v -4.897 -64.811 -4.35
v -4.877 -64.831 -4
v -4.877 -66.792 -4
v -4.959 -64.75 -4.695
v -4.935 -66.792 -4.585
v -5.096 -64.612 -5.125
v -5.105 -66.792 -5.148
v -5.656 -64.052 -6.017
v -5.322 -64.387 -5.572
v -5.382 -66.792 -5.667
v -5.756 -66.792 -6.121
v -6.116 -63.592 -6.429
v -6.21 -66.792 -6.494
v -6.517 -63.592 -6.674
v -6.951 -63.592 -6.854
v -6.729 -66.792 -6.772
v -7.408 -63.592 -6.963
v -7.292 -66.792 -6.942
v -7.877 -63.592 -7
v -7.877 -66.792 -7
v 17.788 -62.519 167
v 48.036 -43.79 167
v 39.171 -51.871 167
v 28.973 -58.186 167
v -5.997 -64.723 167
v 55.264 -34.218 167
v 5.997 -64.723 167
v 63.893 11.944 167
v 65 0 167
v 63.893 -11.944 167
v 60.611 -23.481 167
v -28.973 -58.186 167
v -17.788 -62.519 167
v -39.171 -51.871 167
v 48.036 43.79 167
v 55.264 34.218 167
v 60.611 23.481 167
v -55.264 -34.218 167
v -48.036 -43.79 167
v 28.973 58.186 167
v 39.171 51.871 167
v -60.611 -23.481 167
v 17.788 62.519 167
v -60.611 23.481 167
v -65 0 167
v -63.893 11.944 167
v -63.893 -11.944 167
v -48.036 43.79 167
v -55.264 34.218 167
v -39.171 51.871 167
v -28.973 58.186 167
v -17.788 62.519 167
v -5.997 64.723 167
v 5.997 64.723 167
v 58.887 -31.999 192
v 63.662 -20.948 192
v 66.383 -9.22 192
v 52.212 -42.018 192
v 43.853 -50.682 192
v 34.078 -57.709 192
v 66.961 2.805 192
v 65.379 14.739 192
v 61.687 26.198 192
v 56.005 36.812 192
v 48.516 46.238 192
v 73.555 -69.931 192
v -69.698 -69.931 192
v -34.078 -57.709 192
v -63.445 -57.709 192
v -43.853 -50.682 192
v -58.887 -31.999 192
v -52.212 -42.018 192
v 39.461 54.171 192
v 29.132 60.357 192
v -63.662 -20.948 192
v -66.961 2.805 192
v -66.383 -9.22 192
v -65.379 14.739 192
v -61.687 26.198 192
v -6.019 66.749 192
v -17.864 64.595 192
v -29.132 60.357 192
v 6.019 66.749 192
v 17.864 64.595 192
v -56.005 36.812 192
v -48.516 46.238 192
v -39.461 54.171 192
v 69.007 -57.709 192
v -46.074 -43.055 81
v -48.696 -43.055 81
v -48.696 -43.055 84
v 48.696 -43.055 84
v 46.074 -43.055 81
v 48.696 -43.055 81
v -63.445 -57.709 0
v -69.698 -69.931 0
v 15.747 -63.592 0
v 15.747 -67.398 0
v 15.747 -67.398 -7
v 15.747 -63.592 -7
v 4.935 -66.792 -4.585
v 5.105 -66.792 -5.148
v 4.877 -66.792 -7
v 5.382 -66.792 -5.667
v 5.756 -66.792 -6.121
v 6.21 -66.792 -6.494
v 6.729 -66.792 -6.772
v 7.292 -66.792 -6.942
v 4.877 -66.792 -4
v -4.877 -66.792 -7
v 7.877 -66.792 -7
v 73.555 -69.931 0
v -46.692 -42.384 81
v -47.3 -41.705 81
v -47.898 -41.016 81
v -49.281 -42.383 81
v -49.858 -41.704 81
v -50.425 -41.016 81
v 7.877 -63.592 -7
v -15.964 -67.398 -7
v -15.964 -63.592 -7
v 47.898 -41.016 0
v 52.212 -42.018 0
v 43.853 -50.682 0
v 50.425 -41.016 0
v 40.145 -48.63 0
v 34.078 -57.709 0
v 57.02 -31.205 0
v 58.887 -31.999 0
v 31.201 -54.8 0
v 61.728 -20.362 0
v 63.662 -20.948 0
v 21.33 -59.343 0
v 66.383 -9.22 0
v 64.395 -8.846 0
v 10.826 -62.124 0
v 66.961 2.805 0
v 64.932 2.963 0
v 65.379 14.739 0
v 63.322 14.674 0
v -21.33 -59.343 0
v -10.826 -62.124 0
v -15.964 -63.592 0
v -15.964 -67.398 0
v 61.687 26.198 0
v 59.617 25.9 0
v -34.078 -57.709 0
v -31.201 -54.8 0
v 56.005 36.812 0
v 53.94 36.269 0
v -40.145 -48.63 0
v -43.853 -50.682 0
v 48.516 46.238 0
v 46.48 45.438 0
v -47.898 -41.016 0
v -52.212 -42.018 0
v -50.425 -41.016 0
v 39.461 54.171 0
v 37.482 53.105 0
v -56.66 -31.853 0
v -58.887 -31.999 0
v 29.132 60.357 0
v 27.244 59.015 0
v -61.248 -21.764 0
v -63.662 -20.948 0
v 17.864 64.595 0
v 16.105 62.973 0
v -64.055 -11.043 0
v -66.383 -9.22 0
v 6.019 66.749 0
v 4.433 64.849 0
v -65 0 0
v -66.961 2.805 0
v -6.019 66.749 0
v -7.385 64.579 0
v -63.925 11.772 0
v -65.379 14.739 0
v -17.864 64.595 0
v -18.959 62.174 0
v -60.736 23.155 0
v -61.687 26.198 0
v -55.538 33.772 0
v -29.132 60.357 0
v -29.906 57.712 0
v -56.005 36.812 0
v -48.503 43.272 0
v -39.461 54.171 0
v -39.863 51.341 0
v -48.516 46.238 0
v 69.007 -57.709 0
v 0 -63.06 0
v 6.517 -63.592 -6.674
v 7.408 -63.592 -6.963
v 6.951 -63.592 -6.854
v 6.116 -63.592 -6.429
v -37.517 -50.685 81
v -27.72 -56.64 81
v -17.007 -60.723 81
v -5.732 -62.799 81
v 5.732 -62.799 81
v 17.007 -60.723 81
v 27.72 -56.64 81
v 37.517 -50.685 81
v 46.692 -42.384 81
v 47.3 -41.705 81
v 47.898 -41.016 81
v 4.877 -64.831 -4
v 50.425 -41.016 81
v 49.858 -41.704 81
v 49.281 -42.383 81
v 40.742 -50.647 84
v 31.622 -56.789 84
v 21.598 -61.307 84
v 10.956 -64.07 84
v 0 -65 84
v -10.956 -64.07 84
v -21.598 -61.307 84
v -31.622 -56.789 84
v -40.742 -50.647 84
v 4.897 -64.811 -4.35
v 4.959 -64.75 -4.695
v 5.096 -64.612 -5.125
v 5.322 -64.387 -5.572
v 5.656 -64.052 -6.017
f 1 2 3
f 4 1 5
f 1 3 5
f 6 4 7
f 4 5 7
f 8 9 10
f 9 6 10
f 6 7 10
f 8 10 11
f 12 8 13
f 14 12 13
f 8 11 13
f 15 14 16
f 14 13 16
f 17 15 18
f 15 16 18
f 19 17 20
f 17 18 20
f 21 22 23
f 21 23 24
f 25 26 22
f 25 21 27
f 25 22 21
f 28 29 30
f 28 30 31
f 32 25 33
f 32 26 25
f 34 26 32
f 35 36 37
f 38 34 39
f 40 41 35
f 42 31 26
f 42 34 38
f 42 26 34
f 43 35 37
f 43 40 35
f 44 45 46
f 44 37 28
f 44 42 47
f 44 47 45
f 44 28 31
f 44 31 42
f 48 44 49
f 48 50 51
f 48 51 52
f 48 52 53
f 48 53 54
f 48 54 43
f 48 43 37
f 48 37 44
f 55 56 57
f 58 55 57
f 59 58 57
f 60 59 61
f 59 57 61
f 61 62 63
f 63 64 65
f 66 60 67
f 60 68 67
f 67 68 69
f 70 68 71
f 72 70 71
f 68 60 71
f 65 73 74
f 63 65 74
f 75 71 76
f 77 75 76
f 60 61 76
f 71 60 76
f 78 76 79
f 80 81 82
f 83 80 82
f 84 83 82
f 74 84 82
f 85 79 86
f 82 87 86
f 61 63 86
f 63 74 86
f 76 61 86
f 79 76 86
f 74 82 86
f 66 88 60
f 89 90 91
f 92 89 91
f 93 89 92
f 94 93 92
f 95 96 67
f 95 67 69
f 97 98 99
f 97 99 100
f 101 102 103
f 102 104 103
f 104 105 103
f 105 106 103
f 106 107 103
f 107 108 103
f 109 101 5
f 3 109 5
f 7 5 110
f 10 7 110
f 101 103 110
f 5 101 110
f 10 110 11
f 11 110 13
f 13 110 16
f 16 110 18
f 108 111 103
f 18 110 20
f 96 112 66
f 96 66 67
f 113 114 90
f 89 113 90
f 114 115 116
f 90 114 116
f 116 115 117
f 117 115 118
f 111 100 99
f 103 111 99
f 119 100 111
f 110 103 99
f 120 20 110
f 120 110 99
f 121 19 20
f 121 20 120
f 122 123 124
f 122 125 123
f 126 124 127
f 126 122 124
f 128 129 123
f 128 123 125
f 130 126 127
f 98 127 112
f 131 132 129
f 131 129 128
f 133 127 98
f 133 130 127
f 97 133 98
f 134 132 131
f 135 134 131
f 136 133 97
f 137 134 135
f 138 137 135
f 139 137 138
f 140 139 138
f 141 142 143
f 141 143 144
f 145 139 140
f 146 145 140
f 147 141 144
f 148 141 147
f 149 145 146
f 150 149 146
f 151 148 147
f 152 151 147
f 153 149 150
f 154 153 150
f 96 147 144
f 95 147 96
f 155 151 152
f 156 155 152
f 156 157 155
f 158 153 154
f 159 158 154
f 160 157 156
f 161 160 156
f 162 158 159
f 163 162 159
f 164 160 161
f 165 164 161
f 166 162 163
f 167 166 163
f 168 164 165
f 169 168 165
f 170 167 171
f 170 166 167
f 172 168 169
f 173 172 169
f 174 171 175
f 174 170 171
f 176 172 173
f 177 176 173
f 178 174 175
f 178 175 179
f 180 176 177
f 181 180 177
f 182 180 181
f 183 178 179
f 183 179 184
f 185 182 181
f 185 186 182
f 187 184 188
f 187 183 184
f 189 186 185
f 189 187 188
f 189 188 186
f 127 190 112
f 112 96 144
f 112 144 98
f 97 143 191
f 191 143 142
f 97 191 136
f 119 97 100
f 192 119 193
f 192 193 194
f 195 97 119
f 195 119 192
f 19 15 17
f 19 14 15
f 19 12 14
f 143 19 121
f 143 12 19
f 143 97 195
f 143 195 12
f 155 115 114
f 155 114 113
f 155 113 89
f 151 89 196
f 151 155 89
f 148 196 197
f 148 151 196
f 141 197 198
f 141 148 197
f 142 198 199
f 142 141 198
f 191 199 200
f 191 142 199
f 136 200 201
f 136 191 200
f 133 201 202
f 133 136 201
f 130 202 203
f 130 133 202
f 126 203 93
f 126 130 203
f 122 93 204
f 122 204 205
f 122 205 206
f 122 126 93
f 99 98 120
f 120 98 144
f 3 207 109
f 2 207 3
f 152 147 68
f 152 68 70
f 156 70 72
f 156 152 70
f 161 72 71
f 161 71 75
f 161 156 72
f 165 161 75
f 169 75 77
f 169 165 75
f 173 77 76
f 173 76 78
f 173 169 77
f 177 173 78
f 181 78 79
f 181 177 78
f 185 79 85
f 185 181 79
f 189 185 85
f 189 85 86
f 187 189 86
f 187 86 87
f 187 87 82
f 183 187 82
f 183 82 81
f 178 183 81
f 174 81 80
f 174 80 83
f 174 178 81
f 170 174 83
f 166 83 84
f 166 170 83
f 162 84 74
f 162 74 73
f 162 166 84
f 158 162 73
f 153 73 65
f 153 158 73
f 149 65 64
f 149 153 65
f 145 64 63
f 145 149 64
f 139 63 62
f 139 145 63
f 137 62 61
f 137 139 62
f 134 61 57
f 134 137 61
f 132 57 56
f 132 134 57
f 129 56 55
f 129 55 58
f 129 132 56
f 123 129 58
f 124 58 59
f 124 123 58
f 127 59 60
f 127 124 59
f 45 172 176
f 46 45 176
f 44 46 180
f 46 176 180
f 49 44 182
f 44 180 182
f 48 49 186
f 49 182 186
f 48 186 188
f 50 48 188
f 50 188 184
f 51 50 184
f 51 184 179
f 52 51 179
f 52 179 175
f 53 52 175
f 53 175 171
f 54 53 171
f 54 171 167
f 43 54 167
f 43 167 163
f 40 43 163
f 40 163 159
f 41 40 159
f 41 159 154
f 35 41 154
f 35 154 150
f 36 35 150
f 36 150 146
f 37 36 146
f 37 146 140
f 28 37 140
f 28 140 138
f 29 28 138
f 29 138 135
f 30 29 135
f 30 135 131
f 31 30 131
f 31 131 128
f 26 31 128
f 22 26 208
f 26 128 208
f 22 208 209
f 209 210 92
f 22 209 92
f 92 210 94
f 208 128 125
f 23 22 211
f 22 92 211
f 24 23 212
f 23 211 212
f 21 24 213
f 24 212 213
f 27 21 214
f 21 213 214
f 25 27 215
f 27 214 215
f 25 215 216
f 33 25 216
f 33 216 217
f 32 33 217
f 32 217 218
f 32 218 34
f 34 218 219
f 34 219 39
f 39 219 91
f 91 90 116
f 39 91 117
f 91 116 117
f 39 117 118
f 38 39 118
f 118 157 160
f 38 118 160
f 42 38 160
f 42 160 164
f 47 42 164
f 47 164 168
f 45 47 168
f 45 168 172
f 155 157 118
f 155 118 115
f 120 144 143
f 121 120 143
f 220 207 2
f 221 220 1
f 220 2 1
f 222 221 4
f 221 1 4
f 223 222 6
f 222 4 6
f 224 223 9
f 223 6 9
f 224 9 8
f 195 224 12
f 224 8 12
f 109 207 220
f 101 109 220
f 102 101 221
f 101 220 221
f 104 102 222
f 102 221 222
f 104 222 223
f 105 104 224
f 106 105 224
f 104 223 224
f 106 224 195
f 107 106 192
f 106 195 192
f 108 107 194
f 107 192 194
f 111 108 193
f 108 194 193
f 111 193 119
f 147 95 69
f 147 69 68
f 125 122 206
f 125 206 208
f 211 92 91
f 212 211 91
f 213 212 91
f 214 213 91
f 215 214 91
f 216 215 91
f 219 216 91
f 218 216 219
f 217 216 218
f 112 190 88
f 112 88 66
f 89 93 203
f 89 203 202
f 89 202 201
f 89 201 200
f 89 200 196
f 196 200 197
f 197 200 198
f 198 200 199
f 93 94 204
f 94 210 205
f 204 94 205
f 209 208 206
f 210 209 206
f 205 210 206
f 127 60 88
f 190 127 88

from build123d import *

# Parameters (mm, degrees)
EXTRUDE_2_DEPTH     = 192
SKETCH_5_R          = 60
CUT_EXTRUDE_2_DEPTH = 167
SKETCH_6_R          = 65
CUT_EXTRUDE_3_DEPTH = 167
EXTRUDE_3_DEPTH     = 81
SKETCH_8_W          = 31.710893006
SKETCH_8_H          = 3.805307161
EXTRUDE_4_DEPTH     = 7
SKETCH_9_W          = 9.753754566
SKETCH_9_H          = 1.960413463
CUT_EXTRUDE_4_DEPTH = 3
FILLET_1_R          = 3
EXTRUDE_5_DEPTH     = 3


with BuildPart() as part:
    # 草图4 → 凸台-拉伸2 (new body)
    with BuildSketch(Plane.XY):
        with BuildLine():
            Line((-63.444815749, -57.709462621), (-34.077926376, -57.709462621))
            ThreePointArc((-34.077926376, -57.709462621), (0, 67.020050299), (34.077926376, -57.709462621))
            Line((34.077926376, -57.709462621), (69.007018872, -57.709462621))
            Line((69.007018872, -57.709462621), (73.554721348, -69.931413026))
            Line((73.554721348, -69.931413026), (-69.697906654, -69.931413026))
            Line((-69.697906654, -69.931413026), (-63.444815749, -57.709462621))
        make_face()
    extrude(amount=EXTRUDE_2_DEPTH)

    # 草图5 → 切除-拉伸2 (cut)
    with BuildSketch(Plane(origin=(0, 0, 0), x_dir=(-1, 0, 0), z_dir=(0, 0, -1))):
        Circle(SKETCH_5_R)
    extrude(amount=-CUT_EXTRUDE_2_DEPTH, mode=Mode.SUBTRACT)

    # 草图6 → 切除-拉伸3 (cut)
    with BuildSketch(Plane(origin=(0, 0, 0), x_dir=(-1, 0, 0), z_dir=(0, 0, -1))):
        Circle(SKETCH_6_R)
    extrude(amount=-CUT_EXTRUDE_3_DEPTH, mode=Mode.SUBTRACT)

    # 草图7 → 凸台-拉伸3 (add)
    with BuildSketch(Plane(origin=(0, 0, 0), x_dir=(-1, 0, 0), z_dir=(0, 0, -1))):
        with BuildLine():
            Line((-47.897732915, -41.016239679), (-50.424875633, -41.016239679))
            ThreePointArc((-50.424875633, -41.016239679), (0, -65), (50.424875633, -41.016239679))
            Line((50.424875633, -41.016239679), (47.897732915, -41.016239679))
            ThreePointArc((47.897732915, -41.016239679), (0, -63.059691846), (-47.897732915, -41.016239679))
        make_face()
    extrude(amount=-EXTRUDE_3_DEPTH)

    # 草图8 → 凸台-拉伸4 (add)
    with BuildSketch(Plane(origin=(0, 0, 0), x_dir=(-1, 0, 0), z_dir=(0, 0, -1))):
        with Locations((0.108672156, -65.494898904)):
            Rectangle(SKETCH_8_W, SKETCH_8_H)
    extrude(amount=EXTRUDE_4_DEPTH)

    # 草图9 → 切除-拉伸4 (cut)
    with BuildSketch(Plane(origin=(0, 0, -7), x_dir=(-1, 0, 0), z_dir=(0, 0, -1))):
        with Locations((0, -65.811506795)):
            Rectangle(SKETCH_9_W, SKETCH_9_H)
    extrude(amount=-CUT_EXTRUDE_4_DEPTH, mode=Mode.SUBTRACT)

    # 圆角1
    # the kernel refuses this fillet: 3 mm, written as the material it takes off along each edge
    with BuildSketch(Plane(origin=(-4.876877283, -66.791713526, -7), x_dir=(-1, 0, 0), z_dir=(0, 1, 0)), Plane(origin=(4.876877283, -64.831300063, -7), x_dir=(1, 0, 0), z_dir=(0, -1, 0))) as fillet_1_piece_1:
        with BuildLine():
            CenterArc((FILLET_1_R, FILLET_1_R), FILLET_1_R, 180, 90)
            Line((0, FILLET_1_R), (-FILLET_1_R * 0.02, FILLET_1_R))
            Line((-FILLET_1_R * 0.02, FILLET_1_R), (-FILLET_1_R * 0.02, -FILLET_1_R * 0.02))
            Line((-FILLET_1_R * 0.02, -FILLET_1_R * 0.02), (FILLET_1_R, -FILLET_1_R * 0.02))
            Line((FILLET_1_R, -FILLET_1_R * 0.02), (FILLET_1_R, 0))
        make_face()
    extrude(amount=1.960413463, mode=Mode.SUBTRACT)
    with BuildSketch(Plane(origin=(-4.876877283, -64.831300063, -7), x_dir=(0, 1, 0), z_dir=(1, 0, 0))) as fillet_1_piece_2:
        with BuildLine():
            CenterArc((FILLET_1_R, FILLET_1_R), FILLET_1_R, 180, 90)
            Line((0, FILLET_1_R), (-FILLET_1_R * 0.02, FILLET_1_R))
            Line((-FILLET_1_R * 0.02, FILLET_1_R), (-FILLET_1_R * 0.02, -FILLET_1_R * 0.02))
            Line((-FILLET_1_R * 0.02, -FILLET_1_R * 0.02), (FILLET_1_R, -FILLET_1_R * 0.02))
            Line((FILLET_1_R, -FILLET_1_R * 0.02), (FILLET_1_R, 0))
        make_face()
    extrude(amount=9.753754565, mode=Mode.SUBTRACT)
    with BuildSketch(Plane(origin=(-12.376877283, -64.831300063, -7), x_dir=(0, 1, 0), z_dir=(1, 0, 0))) as fillet_1_piece_3a_section:
        with BuildLine():
            CenterArc((FILLET_1_R, FILLET_1_R), FILLET_1_R, 180, 90)
            Line((0, FILLET_1_R), (-FILLET_1_R * 0.02, FILLET_1_R))
            Line((-FILLET_1_R * 0.02, FILLET_1_R), (-FILLET_1_R * 0.02, -FILLET_1_R * 0.02))
            Line((-FILLET_1_R * 0.02, -FILLET_1_R * 0.02), (FILLET_1_R, -FILLET_1_R * 0.02))
            Line((FILLET_1_R, -FILLET_1_R * 0.02), (FILLET_1_R, 0))
        make_face()
    fillet_1_piece_3a = extrude(amount=17.253754565, mode=Mode.PRIVATE)
    fillet_1_piece_3a = split(fillet_1_piece_3a, bisect_by=Plane(origin=(-4.876877283, -64.15211472, -6.320814657), z_dir=(-1, 0, 0)), keep=Keep.TOP, mode=Mode.PRIVATE)
    with BuildSketch(Plane(origin=(-4.876877283, -66.791713526, -7), x_dir=(-1, 0, 0), z_dir=(0, 1, 0))) as fillet_1_piece_3b_section:
        with BuildLine():
            CenterArc((FILLET_1_R, FILLET_1_R), FILLET_1_R, 180, 90)
            Line((0, FILLET_1_R), (-FILLET_1_R * 0.02, FILLET_1_R))
            Line((-FILLET_1_R * 0.02, FILLET_1_R), (-FILLET_1_R * 0.02, -FILLET_1_R * 0.02))
            Line((-FILLET_1_R * 0.02, -FILLET_1_R * 0.02), (FILLET_1_R, -FILLET_1_R * 0.02))
            Line((FILLET_1_R, -FILLET_1_R * 0.02), (FILLET_1_R, 0))
        make_face()
    fillet_1_piece_3b = extrude(amount=9.460413463, mode=Mode.PRIVATE)
    fillet_1_piece_3b = split(fillet_1_piece_3b, bisect_by=Plane(origin=(-5.556062626, -64.831300063, -6.320814657), z_dir=(0, 1, 0)), keep=Keep.TOP, mode=Mode.PRIVATE)
    fillet_1_piece_3 = fillet_1_piece_3a & fillet_1_piece_3b
    add(fillet_1_piece_3, mode=Mode.SUBTRACT)
    with BuildSketch(Plane(origin=(4.876877283, -57.331300063, -7), x_dir=(1, 0, 0), z_dir=(0, -1, 0))) as fillet_1_piece_4a_section:
        with BuildLine():
            CenterArc((FILLET_1_R, FILLET_1_R), FILLET_1_R, 180, 90)
            Line((0, FILLET_1_R), (-FILLET_1_R * 0.02, FILLET_1_R))
            Line((-FILLET_1_R * 0.02, FILLET_1_R), (-FILLET_1_R * 0.02, -FILLET_1_R * 0.02))
            Line((-FILLET_1_R * 0.02, -FILLET_1_R * 0.02), (FILLET_1_R, -FILLET_1_R * 0.02))
            Line((FILLET_1_R, -FILLET_1_R * 0.02), (FILLET_1_R, 0))
        make_face()
    fillet_1_piece_4a = extrude(amount=9.460413463, mode=Mode.PRIVATE)
    fillet_1_piece_4a = split(fillet_1_piece_4a, bisect_by=Plane(origin=(5.556062626, -64.831300063, -6.320814657), z_dir=(0, 1, 0)), keep=Keep.TOP, mode=Mode.PRIVATE)
    with BuildSketch(Plane(origin=(-4.876877283, -64.831300063, -7), x_dir=(0, 1, 0), z_dir=(1, 0, 0))) as fillet_1_piece_4b_section:
        with BuildLine():
            CenterArc((FILLET_1_R, FILLET_1_R), FILLET_1_R, 180, 90)
            Line((0, FILLET_1_R), (-FILLET_1_R * 0.02, FILLET_1_R))
            Line((-FILLET_1_R * 0.02, FILLET_1_R), (-FILLET_1_R * 0.02, -FILLET_1_R * 0.02))
            Line((-FILLET_1_R * 0.02, -FILLET_1_R * 0.02), (FILLET_1_R, -FILLET_1_R * 0.02))
            Line((FILLET_1_R, -FILLET_1_R * 0.02), (FILLET_1_R, 0))
        make_face()
    fillet_1_piece_4b = extrude(amount=17.253754565, mode=Mode.PRIVATE)
    fillet_1_piece_4b = split(fillet_1_piece_4b, bisect_by=Plane(origin=(4.876877283, -64.15211472, -6.320814657), z_dir=(1, 0, 0)), keep=Keep.TOP, mode=Mode.PRIVATE)
    fillet_1_piece_4 = fillet_1_piece_4a & fillet_1_piece_4b
    add(fillet_1_piece_4, mode=Mode.SUBTRACT)

    # 草图10 → 凸台-拉伸5 (add)
    with BuildSketch(Plane.XY.offset(81)):
        with BuildLine():
            Line((-49.354840822, -43.055078484), (49.354840822, -43.055078484))
            ThreePointArc((49.354840822, -43.055078484), (0, -65.495344078), (-49.354840822, -43.055078484))
        make_face()
    extrude(amount=EXTRUDE_5_DEPTH)


solid = part.part
